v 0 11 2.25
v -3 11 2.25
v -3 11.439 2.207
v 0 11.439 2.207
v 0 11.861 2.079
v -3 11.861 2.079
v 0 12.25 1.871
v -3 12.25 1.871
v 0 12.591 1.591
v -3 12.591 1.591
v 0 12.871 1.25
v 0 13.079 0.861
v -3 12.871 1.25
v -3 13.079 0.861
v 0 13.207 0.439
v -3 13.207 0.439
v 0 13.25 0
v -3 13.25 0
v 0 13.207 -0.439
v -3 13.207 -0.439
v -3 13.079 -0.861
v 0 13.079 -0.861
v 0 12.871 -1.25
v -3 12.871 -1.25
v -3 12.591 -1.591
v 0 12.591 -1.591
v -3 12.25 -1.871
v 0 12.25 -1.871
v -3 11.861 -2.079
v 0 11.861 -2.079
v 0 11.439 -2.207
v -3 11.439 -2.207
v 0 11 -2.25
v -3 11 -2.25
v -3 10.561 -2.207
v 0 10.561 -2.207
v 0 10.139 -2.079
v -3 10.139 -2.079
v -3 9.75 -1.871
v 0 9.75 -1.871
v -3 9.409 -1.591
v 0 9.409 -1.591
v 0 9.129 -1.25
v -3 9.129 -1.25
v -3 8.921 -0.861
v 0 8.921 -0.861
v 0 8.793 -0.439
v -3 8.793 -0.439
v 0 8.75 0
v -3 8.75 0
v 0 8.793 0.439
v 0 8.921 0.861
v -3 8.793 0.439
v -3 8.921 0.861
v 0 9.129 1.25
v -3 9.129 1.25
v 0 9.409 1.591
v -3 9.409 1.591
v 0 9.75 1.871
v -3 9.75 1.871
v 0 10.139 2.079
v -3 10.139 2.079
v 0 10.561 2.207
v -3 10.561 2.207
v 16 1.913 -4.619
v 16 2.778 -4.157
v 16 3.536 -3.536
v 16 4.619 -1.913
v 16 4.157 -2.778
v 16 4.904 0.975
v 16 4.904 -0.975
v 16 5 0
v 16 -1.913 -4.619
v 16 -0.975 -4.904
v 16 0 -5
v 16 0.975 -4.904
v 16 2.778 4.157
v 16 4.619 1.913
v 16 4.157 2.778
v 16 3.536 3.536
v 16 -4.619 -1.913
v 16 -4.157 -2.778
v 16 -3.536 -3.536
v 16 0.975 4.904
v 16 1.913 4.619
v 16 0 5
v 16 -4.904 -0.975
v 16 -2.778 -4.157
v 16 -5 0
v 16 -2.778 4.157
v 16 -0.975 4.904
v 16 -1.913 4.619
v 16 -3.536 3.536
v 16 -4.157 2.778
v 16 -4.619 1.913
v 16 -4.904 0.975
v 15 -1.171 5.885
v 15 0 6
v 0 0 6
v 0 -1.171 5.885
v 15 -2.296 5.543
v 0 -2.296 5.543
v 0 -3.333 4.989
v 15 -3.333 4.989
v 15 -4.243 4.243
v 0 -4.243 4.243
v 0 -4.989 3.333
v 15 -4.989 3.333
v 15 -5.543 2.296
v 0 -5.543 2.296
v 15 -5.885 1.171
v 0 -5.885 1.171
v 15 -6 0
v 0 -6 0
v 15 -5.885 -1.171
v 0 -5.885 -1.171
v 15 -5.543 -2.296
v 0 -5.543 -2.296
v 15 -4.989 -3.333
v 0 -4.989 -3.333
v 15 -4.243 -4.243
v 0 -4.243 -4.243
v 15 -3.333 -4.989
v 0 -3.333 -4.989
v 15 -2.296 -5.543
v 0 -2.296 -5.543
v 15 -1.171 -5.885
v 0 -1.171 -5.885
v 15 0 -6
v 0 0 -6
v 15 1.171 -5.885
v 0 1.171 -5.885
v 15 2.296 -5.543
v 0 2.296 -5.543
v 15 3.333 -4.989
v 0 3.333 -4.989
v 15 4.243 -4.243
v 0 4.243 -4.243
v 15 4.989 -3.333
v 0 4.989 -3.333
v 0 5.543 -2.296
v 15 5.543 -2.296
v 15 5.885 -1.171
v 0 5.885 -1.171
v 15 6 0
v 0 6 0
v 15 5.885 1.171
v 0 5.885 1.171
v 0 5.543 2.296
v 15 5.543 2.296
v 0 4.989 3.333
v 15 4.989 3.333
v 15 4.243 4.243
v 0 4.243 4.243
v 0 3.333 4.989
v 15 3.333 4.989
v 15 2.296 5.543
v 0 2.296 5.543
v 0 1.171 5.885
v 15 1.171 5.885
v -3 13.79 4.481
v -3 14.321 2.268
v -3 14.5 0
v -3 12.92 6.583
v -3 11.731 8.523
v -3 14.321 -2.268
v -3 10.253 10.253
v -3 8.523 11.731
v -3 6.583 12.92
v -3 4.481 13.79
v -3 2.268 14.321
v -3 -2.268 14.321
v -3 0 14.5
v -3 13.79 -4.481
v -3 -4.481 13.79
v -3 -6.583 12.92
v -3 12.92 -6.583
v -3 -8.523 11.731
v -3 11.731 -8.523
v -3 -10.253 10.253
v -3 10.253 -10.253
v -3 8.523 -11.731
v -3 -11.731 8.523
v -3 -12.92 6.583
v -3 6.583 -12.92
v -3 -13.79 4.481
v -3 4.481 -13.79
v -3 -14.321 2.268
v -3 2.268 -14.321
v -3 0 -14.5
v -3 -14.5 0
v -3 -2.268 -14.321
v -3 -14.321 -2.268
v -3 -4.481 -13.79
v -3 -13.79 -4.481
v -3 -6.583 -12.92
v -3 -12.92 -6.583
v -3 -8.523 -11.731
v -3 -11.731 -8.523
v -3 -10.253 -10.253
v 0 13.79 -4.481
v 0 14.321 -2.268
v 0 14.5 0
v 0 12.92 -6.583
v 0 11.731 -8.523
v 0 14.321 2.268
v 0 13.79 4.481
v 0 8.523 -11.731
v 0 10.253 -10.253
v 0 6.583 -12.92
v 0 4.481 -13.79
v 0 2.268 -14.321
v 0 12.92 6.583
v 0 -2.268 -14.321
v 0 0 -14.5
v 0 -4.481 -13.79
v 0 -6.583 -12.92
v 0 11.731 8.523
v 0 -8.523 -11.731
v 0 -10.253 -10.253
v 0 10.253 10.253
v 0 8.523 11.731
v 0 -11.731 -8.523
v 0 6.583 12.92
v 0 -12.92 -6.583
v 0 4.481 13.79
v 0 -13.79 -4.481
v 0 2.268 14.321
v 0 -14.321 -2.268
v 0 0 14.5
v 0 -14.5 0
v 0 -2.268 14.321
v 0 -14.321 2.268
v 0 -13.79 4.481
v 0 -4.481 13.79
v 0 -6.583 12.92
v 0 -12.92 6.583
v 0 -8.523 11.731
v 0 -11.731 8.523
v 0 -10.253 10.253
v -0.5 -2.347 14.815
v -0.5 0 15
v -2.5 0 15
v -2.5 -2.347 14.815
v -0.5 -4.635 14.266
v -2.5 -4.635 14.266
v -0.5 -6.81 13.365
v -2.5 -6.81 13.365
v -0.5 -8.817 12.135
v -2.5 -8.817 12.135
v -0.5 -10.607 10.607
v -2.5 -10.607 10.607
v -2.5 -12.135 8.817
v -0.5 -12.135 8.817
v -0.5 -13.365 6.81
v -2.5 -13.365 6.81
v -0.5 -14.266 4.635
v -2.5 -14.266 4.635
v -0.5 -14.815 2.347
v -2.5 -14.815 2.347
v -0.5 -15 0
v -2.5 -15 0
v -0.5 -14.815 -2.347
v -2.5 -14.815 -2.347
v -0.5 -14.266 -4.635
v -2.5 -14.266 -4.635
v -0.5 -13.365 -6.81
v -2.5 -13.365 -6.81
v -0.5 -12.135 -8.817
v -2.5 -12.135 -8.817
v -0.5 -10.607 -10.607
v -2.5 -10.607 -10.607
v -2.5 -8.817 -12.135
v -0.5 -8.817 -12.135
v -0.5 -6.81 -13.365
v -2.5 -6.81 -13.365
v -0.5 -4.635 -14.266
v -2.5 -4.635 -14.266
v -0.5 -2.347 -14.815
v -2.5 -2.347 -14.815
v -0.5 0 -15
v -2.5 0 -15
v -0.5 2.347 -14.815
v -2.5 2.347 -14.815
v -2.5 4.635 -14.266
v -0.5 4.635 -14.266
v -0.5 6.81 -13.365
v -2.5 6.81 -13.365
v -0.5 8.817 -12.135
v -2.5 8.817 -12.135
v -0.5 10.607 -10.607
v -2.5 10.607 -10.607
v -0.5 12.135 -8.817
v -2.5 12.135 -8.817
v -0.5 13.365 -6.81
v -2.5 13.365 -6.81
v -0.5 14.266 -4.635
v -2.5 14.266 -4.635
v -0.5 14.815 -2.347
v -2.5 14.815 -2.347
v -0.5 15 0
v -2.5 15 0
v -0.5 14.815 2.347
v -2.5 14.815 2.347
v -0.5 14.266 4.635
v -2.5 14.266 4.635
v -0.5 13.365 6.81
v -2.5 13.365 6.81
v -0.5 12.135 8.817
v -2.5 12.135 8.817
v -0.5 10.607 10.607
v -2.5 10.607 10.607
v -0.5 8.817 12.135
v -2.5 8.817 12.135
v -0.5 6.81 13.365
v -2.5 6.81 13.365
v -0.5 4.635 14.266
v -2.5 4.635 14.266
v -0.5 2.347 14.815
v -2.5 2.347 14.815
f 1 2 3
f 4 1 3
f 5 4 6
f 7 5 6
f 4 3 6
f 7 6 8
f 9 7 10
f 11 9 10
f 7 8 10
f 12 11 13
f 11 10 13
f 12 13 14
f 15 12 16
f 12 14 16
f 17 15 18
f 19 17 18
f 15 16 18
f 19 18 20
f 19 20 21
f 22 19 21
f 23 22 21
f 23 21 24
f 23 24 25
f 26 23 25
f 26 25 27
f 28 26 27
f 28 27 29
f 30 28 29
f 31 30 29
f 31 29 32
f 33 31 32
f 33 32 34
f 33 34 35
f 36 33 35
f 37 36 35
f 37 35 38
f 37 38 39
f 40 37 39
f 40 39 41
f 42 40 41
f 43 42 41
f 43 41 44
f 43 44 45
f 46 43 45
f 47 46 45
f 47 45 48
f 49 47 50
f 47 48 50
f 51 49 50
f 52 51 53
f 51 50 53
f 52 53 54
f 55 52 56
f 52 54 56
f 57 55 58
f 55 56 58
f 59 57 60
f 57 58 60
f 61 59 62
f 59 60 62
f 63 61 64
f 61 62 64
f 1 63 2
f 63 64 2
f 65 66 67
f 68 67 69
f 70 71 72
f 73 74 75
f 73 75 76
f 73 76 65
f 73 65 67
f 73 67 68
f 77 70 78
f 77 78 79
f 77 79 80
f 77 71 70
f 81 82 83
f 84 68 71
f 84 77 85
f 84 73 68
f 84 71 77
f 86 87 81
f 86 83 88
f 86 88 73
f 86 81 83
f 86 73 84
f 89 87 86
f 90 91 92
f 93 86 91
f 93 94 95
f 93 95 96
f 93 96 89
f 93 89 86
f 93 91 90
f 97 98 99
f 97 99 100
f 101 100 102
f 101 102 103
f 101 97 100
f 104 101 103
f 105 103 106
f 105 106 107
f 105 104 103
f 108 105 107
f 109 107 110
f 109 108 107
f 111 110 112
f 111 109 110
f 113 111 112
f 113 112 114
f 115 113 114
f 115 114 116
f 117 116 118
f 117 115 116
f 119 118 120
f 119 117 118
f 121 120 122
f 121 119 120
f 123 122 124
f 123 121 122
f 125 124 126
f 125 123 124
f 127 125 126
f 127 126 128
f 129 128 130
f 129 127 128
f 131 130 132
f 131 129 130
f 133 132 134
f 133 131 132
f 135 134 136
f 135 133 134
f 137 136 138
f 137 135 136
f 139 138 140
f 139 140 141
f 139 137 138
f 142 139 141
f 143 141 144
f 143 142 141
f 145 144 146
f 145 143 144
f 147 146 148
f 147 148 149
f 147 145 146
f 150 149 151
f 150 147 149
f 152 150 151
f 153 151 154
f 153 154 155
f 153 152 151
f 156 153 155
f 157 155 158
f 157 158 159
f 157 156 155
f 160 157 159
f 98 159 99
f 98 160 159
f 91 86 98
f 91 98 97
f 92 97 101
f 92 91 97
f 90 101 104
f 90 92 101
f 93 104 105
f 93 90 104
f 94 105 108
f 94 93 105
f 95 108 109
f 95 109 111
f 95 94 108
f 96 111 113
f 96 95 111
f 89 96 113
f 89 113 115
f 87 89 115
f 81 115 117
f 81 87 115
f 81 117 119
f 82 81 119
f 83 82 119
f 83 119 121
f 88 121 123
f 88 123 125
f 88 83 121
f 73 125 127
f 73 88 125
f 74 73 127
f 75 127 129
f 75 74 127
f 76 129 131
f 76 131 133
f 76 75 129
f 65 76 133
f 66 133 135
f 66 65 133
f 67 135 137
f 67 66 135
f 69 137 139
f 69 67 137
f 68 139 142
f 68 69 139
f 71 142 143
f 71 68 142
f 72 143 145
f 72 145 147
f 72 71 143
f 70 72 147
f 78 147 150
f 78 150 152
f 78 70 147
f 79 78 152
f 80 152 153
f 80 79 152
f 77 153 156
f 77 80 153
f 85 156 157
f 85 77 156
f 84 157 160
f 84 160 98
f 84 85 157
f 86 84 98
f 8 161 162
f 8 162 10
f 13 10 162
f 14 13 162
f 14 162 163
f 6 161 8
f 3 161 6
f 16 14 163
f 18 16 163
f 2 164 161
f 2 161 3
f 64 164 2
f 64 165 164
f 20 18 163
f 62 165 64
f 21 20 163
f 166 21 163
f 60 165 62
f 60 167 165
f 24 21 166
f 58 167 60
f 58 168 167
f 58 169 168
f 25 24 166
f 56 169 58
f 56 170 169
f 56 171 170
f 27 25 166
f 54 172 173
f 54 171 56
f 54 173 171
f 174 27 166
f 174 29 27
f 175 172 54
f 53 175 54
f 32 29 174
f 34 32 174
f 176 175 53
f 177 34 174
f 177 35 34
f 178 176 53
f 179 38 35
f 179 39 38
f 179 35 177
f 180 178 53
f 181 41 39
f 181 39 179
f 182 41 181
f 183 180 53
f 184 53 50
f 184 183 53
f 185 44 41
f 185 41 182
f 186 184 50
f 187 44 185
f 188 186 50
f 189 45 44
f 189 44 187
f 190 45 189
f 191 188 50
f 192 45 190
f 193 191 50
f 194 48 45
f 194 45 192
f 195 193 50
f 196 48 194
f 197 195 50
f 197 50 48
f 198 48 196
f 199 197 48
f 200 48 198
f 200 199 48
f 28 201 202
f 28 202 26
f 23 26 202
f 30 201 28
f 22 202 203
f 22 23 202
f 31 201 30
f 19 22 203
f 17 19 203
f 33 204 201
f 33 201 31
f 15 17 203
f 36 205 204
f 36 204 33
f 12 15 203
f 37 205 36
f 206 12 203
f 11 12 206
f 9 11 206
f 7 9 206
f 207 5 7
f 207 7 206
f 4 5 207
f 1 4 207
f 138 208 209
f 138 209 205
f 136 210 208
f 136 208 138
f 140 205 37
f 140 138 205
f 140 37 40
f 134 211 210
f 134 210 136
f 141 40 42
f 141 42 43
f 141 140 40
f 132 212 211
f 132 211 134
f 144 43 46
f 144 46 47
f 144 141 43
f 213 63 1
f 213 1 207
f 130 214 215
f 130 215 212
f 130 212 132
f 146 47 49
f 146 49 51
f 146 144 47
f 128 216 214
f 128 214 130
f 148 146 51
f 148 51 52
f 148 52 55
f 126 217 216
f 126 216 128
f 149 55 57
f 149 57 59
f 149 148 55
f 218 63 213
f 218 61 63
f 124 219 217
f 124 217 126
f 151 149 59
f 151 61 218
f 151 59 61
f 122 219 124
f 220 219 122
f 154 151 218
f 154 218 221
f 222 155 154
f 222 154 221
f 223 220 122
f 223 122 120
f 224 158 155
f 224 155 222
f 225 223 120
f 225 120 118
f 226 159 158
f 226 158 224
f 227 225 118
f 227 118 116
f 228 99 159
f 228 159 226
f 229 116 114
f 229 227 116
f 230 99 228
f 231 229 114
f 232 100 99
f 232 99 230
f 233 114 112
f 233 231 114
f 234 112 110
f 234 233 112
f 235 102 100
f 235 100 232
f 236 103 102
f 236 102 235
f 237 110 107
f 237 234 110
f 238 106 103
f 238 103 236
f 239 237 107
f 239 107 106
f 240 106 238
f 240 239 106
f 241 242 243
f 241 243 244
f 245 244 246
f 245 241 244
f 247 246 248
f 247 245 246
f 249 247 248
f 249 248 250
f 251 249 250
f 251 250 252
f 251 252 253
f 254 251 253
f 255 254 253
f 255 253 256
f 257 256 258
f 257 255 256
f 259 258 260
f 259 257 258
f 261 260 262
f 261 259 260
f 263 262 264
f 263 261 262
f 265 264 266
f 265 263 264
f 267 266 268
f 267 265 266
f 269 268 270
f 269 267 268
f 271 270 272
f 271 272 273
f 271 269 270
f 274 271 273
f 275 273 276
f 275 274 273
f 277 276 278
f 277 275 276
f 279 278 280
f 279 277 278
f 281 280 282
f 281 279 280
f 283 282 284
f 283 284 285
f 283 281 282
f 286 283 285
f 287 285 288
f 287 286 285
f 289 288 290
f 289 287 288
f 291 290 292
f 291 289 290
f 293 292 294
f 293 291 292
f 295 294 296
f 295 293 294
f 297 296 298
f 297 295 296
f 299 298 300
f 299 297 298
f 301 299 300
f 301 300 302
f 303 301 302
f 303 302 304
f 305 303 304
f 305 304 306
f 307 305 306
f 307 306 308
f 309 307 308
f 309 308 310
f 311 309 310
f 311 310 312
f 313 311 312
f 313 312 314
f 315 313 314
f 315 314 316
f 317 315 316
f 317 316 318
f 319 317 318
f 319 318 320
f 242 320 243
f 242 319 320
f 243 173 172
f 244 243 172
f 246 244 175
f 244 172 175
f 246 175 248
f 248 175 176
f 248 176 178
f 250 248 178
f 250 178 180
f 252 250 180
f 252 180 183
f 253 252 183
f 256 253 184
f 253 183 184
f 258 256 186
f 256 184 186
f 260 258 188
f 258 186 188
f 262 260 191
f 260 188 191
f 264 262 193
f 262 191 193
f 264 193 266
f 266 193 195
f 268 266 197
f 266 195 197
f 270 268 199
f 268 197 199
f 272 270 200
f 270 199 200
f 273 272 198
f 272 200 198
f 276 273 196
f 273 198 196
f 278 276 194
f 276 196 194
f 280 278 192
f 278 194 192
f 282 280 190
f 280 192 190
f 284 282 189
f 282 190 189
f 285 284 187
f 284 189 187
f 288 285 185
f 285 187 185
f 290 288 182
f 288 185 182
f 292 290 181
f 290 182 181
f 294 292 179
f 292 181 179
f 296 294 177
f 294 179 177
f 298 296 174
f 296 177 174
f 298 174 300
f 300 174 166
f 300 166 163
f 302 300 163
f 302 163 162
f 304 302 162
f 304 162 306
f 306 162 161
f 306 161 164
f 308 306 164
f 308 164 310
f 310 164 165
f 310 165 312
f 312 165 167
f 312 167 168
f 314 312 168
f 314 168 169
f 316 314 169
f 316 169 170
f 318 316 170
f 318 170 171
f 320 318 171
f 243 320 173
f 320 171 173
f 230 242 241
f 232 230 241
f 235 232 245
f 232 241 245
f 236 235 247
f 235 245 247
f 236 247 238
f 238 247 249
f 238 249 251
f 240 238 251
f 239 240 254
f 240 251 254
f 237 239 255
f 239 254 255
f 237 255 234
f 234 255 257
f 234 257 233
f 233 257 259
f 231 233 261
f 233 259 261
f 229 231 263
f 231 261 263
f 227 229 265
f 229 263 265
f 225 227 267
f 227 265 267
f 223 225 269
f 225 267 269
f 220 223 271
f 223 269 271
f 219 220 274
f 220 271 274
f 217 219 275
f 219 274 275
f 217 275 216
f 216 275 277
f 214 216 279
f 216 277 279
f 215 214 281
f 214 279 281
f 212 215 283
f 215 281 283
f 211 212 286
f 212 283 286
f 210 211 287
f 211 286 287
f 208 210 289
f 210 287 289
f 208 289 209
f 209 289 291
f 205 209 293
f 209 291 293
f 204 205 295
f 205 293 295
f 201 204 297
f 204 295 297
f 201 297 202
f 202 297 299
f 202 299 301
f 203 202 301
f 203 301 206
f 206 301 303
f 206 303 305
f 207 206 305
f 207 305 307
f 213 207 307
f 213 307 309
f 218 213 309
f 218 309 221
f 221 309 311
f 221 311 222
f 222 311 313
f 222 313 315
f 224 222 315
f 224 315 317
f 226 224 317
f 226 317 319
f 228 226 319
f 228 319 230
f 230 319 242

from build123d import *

# Parameters (mm, degrees)
CHANFREIN1_SIZE         = 1
CHANFREIN2_SIZE         = 0.5
ESQUISSE2_R             = 2.25
ENL_V_MAT_EXTRU_1_DEPTH = 29.478061732


with BuildPart() as part:
    # Esquisse1 → Base-Révolution (revolve)
    with BuildSketch(Plane.XY, mode=Mode.PRIVATE) as base_r_volution_sk:
        Polygon((-3, 0), (-3, 15), (0, 15), (0, 6), (16, 6), (16, 0), align=None)
    revolve(base_r_volution_sk.sketch.rotate(Axis((-27.336707152, 0, 0), (1, 0, 0)), 90), axis=Axis((-27.336707152, 0, 0), (1, 0, 0)))

    # Chanfrein1
    chanfrein1_edges = [part.edges().sort_by_distance(p)[0] for p in [
        (16, 0, -6),
    ]]
    chamfer(chanfrein1_edges, length=CHANFREIN1_SIZE)

    # Chanfrein2
    chanfrein2_edges = [part.edges().sort_by_distance(p)[0] for p in [
        (-3, 0, -15),
        (0, 0, -15),
    ]]
    chamfer(chanfrein2_edges, length=CHANFREIN2_SIZE)

    # Esquisse2 → Enlèv. mat.-Extru.1 (cut, through all)
    with BuildSketch(Plane.ZY.offset(3)):
        with Locations((0, 11)):
            Circle(ESQUISSE2_R)
    extrude(amount=-ENL_V_MAT_EXTRU_1_DEPTH, mode=Mode.SUBTRACT)


solid = part.part
